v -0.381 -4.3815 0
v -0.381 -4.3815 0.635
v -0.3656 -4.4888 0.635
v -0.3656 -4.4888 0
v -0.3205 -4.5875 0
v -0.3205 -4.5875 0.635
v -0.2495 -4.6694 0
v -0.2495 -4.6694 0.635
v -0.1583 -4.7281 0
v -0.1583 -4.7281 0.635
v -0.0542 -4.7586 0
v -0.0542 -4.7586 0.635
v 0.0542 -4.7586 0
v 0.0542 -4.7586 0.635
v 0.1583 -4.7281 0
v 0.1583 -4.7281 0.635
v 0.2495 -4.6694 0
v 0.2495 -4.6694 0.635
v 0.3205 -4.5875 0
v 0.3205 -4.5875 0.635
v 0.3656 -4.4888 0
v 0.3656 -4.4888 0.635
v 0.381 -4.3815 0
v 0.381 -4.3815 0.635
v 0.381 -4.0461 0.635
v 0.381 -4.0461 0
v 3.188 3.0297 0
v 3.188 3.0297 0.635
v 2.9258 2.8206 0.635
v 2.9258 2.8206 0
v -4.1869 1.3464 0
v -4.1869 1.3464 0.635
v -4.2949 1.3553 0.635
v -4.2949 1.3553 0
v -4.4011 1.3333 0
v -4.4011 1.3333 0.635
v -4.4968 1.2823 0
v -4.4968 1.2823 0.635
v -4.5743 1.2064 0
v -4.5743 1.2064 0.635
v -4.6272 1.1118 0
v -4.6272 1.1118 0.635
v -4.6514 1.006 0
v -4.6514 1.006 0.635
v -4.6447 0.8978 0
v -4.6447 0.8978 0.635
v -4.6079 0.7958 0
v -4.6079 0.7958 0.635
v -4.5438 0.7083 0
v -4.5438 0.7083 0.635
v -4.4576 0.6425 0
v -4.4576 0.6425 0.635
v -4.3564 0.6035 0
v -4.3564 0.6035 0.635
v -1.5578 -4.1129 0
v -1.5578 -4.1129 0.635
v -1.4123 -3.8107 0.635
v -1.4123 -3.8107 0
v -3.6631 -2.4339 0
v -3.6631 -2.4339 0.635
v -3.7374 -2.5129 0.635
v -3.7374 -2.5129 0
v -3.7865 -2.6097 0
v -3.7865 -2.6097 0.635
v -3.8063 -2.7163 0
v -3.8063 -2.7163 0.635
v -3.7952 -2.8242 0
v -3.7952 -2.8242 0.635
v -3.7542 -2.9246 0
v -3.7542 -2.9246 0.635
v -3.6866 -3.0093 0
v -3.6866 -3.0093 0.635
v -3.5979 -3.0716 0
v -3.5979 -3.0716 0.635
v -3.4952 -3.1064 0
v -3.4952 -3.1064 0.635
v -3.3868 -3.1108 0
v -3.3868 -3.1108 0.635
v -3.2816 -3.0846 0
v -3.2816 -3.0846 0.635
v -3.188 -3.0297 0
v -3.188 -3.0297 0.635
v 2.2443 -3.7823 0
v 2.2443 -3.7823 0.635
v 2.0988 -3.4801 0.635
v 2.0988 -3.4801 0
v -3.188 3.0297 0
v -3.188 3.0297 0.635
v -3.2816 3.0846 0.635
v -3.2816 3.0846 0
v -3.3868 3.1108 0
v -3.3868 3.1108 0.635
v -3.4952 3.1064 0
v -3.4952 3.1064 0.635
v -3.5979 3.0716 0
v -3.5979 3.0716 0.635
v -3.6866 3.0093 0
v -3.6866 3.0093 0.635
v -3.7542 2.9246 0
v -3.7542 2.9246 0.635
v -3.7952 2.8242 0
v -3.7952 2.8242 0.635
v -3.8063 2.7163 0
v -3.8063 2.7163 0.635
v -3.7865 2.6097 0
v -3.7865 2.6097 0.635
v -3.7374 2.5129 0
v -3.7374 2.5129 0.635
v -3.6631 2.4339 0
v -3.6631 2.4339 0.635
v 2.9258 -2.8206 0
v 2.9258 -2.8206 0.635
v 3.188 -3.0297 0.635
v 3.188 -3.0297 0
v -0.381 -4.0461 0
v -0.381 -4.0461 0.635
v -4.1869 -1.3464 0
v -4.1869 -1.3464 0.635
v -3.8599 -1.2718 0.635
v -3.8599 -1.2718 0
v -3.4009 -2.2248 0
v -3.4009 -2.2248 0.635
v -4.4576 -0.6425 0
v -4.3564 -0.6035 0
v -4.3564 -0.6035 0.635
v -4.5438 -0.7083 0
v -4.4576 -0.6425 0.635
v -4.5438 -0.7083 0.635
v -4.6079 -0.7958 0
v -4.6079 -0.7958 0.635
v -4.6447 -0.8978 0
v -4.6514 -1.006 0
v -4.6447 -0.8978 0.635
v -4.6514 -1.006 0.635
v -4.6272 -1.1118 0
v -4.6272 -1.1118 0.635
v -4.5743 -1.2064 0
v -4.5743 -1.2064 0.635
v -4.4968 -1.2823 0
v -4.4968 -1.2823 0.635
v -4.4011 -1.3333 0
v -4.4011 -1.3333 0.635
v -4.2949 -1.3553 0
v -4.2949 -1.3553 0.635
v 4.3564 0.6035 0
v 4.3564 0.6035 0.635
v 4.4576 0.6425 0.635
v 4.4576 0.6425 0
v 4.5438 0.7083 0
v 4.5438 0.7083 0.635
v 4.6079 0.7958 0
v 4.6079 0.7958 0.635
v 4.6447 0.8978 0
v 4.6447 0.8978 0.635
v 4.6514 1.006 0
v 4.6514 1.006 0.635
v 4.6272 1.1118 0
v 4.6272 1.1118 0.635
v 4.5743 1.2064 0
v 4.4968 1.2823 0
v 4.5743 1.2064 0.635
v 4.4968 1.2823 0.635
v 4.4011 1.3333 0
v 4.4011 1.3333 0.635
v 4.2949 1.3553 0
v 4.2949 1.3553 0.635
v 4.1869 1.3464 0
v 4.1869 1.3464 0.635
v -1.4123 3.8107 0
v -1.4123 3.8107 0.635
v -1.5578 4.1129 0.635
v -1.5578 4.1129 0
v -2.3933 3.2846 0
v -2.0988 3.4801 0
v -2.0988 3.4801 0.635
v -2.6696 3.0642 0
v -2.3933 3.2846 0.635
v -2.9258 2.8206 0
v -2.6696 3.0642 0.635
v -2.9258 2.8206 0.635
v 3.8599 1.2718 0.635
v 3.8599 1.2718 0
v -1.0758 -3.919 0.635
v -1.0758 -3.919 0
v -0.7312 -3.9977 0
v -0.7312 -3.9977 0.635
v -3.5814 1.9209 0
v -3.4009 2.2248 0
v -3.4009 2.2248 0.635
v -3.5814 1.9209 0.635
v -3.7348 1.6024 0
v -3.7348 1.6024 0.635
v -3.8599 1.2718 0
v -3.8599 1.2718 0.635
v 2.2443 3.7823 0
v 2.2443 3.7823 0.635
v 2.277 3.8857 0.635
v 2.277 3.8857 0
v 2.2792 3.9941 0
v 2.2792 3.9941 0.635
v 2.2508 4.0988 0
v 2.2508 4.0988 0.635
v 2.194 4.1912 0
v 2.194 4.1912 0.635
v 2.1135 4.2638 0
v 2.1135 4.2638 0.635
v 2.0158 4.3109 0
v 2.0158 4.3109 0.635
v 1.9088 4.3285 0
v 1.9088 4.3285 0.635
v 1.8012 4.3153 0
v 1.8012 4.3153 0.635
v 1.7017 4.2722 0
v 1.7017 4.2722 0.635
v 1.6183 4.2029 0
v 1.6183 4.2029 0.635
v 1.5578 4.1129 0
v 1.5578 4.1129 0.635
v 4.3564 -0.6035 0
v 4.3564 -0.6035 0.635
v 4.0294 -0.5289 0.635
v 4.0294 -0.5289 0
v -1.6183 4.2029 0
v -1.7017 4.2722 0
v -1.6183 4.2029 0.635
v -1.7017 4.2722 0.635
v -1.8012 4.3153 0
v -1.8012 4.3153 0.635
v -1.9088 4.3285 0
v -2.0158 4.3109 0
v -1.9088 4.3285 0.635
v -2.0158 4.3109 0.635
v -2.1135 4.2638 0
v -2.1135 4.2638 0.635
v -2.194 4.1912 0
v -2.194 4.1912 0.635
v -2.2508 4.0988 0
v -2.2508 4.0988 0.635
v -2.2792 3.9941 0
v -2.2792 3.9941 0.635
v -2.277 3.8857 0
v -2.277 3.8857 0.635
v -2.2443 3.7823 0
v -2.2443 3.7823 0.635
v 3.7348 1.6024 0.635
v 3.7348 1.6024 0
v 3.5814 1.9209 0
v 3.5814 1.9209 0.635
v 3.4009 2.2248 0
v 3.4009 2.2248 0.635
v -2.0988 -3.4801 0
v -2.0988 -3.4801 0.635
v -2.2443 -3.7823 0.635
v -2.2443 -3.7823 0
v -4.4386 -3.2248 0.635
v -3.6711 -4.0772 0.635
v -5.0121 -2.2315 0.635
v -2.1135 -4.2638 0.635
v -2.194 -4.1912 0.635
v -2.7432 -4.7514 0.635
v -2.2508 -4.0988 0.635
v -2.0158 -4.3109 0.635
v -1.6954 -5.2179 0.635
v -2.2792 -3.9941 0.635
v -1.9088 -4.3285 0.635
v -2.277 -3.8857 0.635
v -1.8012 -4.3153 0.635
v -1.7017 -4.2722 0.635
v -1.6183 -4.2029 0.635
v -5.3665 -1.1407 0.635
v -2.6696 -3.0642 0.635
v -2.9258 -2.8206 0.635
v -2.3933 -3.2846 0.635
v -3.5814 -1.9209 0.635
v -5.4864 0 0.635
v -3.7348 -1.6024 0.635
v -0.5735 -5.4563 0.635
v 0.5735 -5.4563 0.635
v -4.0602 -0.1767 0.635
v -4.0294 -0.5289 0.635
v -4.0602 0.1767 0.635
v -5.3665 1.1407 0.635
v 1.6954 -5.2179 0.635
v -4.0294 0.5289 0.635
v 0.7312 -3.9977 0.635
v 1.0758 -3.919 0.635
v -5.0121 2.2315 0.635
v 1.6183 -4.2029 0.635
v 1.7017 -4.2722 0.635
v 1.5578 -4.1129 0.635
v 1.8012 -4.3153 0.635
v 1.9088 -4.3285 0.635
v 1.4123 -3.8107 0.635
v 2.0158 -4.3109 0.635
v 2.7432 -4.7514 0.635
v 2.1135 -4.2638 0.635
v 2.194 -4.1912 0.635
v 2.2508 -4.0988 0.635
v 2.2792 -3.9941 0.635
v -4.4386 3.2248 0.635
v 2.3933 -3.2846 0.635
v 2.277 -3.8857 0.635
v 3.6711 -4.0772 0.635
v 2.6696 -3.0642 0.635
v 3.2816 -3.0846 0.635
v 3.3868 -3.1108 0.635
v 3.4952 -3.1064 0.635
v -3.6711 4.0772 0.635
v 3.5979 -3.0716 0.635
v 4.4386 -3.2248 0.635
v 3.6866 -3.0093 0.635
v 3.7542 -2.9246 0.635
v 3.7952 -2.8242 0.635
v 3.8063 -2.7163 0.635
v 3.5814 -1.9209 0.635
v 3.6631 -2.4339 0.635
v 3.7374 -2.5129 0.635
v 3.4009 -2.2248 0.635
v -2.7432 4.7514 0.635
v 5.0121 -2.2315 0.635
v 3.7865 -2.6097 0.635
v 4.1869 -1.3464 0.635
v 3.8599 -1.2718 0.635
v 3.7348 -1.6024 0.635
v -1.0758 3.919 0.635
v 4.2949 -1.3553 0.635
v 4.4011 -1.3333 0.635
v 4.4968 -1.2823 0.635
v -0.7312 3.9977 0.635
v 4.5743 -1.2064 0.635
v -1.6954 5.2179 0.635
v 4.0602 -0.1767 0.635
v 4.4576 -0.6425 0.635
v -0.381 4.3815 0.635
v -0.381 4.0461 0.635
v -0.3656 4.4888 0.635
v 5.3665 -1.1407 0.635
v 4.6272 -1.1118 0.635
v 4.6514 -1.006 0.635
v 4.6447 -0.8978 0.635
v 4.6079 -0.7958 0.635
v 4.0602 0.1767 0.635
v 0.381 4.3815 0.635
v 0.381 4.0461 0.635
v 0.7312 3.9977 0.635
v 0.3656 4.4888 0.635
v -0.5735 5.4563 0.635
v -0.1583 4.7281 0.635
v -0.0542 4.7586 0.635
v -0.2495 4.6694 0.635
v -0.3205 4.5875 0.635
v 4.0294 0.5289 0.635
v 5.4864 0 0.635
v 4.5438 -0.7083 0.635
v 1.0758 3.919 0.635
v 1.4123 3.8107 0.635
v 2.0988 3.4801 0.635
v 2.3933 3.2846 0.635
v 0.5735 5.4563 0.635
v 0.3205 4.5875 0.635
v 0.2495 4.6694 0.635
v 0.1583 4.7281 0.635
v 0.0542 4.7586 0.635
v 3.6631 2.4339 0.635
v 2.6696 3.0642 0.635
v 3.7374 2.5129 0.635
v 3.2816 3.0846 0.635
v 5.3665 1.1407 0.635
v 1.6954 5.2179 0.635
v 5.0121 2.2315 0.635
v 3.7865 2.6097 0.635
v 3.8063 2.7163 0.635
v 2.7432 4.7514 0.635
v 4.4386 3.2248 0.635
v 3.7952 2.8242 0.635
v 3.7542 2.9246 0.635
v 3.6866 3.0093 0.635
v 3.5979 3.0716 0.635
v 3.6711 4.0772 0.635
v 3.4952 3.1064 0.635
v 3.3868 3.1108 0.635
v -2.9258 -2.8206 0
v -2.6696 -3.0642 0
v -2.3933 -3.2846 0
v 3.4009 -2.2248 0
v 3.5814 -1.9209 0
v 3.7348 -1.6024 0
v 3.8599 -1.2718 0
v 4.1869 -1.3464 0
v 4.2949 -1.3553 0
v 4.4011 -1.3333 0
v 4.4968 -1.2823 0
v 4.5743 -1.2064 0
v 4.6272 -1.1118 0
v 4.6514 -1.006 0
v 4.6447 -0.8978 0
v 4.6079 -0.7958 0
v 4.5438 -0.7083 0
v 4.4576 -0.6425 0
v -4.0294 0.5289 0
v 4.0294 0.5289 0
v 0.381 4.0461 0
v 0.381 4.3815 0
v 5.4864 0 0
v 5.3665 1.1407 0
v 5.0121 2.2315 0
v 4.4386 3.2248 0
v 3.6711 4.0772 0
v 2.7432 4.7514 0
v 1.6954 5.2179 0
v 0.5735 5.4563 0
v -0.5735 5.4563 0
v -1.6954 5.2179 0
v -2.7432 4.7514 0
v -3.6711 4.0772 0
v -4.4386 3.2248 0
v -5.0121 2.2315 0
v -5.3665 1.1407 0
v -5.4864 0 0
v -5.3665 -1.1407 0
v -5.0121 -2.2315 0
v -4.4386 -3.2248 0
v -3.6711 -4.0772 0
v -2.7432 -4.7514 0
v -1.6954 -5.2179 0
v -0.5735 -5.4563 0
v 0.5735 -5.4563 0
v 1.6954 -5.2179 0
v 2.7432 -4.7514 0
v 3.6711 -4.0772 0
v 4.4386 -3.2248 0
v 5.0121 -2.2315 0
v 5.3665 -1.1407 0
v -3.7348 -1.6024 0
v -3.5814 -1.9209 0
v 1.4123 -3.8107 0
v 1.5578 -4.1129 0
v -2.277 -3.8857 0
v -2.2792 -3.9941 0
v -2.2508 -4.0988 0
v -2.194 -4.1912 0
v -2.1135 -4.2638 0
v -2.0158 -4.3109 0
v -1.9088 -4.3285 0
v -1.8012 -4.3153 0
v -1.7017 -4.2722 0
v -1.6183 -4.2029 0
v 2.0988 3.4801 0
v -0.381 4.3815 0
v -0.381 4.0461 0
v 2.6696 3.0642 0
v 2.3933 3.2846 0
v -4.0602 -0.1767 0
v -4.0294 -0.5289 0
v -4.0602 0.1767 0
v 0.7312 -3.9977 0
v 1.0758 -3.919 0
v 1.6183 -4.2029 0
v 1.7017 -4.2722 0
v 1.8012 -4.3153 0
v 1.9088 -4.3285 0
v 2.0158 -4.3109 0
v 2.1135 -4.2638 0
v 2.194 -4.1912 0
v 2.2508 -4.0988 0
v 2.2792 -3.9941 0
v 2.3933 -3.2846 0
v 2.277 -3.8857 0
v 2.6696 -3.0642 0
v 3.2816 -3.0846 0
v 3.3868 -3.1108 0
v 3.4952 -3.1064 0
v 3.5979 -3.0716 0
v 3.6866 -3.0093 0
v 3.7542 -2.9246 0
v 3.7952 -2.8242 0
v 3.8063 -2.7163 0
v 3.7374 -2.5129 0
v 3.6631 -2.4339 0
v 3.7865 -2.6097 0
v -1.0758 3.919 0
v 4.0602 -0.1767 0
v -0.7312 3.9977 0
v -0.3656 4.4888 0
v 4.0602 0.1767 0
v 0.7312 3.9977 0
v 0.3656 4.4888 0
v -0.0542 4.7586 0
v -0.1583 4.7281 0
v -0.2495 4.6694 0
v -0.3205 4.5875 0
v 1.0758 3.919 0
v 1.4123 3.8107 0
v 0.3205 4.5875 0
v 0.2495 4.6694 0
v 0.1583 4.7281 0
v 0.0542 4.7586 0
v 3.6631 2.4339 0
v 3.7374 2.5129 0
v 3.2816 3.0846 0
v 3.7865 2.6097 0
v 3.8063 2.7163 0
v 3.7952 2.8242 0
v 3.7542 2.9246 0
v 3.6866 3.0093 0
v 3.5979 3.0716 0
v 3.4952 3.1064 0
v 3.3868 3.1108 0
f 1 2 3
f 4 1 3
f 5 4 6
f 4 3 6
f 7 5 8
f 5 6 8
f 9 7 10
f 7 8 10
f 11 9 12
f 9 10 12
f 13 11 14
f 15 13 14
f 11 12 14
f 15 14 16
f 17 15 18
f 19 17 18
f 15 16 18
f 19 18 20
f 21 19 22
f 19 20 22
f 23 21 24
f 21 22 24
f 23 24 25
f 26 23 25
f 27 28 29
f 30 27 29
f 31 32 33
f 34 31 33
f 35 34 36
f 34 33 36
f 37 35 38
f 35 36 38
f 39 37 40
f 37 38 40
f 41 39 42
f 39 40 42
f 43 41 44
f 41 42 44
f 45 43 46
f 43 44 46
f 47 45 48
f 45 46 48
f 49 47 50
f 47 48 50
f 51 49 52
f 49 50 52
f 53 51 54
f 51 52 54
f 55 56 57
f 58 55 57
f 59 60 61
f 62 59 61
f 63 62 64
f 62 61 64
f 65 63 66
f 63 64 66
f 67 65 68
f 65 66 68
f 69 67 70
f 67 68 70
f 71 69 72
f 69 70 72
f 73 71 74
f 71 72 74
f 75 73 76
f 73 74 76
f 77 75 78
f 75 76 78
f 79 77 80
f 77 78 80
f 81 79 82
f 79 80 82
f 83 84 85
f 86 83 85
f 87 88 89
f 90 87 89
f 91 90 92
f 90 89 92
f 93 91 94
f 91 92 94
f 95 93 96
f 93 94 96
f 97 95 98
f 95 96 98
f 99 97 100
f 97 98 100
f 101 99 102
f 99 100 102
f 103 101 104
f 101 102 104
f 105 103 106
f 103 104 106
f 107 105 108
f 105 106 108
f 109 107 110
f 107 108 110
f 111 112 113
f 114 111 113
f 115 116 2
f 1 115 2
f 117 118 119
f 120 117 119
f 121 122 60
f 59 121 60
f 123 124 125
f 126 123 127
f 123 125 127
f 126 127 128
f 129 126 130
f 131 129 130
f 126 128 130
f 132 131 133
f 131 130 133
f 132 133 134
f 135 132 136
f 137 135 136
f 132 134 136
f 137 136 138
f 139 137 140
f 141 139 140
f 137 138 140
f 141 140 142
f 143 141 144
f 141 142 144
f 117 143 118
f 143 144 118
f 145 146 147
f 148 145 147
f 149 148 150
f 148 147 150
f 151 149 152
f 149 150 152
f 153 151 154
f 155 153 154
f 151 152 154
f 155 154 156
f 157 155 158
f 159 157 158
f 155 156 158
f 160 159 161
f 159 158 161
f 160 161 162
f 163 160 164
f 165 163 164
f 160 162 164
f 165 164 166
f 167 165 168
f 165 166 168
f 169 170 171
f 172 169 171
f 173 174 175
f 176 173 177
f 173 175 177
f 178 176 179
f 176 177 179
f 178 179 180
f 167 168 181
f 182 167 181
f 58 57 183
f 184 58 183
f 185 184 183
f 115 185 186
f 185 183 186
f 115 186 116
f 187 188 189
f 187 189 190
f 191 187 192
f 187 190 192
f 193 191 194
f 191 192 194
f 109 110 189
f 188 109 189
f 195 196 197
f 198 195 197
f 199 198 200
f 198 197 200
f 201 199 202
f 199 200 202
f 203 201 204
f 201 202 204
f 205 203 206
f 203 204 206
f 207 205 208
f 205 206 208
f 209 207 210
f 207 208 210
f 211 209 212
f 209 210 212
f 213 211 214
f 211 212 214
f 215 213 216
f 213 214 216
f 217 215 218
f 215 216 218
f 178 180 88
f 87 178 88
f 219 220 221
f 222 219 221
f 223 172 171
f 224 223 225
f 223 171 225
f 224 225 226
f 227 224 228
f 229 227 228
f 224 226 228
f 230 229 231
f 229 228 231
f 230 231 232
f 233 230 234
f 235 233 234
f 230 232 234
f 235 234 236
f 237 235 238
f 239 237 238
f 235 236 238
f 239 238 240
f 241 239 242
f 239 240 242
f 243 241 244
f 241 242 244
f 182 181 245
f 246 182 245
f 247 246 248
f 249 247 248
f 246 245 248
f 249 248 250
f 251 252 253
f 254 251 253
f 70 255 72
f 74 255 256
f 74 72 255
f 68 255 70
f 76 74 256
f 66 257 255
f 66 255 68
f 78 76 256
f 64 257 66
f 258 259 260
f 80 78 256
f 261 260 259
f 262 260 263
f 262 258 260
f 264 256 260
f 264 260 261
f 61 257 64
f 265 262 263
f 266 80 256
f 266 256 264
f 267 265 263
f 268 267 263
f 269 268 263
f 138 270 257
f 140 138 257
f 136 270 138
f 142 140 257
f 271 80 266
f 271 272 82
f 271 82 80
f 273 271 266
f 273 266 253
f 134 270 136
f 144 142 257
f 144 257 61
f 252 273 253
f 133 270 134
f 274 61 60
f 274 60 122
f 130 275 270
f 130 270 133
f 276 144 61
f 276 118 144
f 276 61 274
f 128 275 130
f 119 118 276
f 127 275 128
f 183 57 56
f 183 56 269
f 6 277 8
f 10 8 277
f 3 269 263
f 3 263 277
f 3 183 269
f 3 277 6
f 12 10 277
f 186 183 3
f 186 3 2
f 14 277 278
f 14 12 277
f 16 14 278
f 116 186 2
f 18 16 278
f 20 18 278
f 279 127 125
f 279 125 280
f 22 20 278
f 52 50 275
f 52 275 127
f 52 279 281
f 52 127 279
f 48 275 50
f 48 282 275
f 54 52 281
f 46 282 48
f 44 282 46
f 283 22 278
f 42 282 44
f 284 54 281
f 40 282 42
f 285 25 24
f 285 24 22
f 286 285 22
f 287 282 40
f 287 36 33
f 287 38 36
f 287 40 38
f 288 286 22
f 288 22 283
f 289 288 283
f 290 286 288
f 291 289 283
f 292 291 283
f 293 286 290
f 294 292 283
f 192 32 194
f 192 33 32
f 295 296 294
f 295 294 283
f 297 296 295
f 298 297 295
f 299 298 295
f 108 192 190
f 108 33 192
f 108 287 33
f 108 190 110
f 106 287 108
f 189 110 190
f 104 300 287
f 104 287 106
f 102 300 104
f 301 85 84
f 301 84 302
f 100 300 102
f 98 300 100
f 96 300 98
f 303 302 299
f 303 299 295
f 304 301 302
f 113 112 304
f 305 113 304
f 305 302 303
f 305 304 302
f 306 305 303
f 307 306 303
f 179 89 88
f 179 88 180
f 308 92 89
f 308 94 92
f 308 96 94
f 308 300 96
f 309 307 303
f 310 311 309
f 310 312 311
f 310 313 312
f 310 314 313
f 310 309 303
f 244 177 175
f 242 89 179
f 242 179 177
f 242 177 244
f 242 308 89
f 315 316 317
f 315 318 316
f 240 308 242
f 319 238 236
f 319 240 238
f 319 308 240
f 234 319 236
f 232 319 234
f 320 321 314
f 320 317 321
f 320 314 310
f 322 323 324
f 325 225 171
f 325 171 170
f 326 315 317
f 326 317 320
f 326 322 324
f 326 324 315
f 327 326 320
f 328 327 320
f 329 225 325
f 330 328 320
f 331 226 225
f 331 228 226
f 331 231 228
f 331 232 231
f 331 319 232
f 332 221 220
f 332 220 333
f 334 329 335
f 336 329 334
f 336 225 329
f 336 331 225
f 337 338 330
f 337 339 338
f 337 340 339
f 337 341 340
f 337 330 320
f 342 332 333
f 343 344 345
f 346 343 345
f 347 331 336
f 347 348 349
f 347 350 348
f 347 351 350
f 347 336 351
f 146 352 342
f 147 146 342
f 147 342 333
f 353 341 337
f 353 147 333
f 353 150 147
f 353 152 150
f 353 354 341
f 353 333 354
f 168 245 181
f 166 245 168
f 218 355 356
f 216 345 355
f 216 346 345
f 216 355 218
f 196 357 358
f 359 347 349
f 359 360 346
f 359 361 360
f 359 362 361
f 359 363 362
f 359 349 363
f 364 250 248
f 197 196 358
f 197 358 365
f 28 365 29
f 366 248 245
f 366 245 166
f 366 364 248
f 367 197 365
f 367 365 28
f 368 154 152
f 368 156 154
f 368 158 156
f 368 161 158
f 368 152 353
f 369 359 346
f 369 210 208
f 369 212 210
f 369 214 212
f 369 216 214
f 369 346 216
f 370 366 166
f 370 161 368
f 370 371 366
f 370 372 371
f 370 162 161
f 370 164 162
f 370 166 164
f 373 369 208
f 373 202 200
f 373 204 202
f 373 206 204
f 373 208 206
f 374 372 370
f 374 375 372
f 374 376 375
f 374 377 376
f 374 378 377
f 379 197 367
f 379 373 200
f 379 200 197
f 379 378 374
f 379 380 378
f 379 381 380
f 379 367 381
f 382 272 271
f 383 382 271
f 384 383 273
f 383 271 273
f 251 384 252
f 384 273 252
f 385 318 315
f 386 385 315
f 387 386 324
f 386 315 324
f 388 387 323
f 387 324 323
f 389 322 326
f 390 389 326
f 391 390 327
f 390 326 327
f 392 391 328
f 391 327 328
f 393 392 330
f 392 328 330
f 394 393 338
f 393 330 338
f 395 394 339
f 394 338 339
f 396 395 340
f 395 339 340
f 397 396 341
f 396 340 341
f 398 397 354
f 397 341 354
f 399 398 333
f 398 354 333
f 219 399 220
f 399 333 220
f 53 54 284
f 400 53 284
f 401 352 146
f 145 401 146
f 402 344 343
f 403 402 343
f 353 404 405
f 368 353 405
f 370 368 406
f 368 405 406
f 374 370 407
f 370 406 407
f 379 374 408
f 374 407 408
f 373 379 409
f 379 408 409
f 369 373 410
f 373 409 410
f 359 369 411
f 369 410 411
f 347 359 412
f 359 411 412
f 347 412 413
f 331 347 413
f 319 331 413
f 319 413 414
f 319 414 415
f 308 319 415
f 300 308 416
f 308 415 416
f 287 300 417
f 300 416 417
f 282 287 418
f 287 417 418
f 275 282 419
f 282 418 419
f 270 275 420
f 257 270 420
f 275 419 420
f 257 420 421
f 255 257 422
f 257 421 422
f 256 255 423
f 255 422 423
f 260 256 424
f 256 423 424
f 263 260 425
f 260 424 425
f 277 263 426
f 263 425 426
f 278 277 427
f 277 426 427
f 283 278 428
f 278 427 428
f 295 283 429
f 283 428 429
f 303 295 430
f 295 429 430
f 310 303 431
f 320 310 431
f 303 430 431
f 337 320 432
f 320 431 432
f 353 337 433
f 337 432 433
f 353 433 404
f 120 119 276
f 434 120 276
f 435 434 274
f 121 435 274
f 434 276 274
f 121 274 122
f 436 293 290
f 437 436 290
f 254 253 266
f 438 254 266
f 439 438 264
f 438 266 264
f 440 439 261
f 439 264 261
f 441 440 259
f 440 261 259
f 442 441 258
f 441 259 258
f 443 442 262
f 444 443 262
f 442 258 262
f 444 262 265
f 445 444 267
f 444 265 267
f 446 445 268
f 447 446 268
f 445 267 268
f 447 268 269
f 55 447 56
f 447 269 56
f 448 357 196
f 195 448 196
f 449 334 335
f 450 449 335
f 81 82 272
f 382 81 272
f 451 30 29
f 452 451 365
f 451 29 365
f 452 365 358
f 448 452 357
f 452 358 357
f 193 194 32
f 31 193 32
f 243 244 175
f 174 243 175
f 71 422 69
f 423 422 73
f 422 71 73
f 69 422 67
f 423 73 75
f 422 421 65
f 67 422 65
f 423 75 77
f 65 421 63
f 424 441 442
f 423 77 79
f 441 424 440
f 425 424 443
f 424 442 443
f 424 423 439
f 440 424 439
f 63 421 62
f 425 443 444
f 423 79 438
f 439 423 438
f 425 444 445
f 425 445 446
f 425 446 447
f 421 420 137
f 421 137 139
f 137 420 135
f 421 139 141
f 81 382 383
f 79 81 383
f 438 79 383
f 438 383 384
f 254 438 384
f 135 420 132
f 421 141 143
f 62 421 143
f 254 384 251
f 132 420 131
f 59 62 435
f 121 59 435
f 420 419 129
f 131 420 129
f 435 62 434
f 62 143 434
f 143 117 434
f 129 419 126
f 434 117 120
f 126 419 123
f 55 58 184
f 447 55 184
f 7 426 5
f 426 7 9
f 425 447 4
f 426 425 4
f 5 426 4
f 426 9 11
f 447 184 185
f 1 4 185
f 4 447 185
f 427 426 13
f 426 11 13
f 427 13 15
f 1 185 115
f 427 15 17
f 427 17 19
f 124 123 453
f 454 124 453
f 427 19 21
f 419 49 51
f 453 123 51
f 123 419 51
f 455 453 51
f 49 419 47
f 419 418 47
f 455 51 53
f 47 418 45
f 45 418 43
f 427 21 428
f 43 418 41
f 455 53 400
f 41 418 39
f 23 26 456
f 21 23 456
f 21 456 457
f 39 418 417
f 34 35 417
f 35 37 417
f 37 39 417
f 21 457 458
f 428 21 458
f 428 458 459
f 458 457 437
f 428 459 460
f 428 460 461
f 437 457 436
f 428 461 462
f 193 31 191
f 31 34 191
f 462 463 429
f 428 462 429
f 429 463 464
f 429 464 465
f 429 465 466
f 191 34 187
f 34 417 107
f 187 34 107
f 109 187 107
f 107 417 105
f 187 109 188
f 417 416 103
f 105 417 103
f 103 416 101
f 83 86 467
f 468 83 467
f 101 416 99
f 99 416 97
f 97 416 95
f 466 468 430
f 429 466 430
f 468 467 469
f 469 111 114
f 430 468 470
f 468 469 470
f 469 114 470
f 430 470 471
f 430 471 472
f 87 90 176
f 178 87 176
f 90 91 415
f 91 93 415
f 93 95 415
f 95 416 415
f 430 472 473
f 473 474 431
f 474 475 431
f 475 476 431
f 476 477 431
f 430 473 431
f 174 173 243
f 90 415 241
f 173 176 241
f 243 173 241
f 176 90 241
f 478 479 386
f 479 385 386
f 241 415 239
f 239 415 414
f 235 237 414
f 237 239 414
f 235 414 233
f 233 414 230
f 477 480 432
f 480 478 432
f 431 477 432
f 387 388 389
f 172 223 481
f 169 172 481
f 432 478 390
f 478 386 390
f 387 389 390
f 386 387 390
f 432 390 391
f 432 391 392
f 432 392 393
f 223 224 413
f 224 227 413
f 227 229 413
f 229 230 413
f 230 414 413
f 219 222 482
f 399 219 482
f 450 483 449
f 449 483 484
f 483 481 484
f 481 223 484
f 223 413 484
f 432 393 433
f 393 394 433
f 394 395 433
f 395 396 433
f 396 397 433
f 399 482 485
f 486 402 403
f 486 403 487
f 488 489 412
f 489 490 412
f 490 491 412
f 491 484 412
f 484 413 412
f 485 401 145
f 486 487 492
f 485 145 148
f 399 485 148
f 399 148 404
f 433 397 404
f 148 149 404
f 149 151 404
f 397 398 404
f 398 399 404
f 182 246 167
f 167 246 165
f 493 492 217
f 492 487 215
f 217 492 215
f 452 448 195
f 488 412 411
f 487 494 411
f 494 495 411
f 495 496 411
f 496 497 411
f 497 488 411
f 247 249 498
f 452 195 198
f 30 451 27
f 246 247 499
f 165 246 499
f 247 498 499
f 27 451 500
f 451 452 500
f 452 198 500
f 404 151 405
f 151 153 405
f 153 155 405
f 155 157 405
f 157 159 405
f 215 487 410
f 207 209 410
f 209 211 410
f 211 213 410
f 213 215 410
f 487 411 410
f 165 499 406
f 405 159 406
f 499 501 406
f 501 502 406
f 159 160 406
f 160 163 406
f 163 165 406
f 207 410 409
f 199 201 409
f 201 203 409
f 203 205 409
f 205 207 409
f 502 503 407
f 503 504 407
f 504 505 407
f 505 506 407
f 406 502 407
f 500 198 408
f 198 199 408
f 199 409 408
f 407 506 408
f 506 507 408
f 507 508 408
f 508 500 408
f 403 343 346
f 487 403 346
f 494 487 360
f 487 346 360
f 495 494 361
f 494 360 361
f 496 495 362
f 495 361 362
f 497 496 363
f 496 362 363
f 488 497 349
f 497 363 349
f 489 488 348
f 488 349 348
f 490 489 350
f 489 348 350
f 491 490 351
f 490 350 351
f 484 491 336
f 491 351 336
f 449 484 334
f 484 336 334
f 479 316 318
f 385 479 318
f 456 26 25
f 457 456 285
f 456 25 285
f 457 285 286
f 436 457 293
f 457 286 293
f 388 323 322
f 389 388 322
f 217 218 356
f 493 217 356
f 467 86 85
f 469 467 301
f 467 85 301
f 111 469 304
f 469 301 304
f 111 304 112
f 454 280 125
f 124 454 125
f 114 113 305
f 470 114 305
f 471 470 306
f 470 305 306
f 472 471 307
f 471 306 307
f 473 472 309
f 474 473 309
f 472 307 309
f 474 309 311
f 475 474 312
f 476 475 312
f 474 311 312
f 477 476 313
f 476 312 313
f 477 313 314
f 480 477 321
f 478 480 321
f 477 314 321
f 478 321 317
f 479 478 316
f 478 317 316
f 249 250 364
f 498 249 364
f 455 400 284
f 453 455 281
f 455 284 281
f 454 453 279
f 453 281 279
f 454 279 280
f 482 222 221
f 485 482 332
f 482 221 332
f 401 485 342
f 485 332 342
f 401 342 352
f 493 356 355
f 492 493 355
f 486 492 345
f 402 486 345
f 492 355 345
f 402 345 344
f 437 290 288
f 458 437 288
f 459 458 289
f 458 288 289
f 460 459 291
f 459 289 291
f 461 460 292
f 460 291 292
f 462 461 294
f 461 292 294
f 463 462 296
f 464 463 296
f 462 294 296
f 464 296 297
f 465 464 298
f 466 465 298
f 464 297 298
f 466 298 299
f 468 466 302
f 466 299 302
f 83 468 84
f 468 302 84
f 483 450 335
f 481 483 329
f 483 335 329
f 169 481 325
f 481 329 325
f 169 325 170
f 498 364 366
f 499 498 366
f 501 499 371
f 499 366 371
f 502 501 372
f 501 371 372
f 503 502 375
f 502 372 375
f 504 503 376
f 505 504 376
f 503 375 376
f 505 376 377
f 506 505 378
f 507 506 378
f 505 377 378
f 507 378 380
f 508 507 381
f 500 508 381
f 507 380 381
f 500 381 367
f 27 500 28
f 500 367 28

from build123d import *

# Parameters (mm, degrees)
SKETCH1_R          = 5.4864
BASE_EXTRUDE_DEPTH = 0.635
SKETCH2_R          = 4.064
CUT_EXTRUDE1_DEPTH = 1.635
CUT_EXTRUDE4_DEPTH = 1.635
CIRPATTERN1_COUNT  = 14


with BuildPart() as part:
    # Sketch1 → Base-Extrude (new body)
    with BuildSketch(Plane.XY):
        Circle(SKETCH1_R)
    extrude(amount=BASE_EXTRUDE_DEPTH)

    # Sketch2 → Cut-Extrude1 (cut, through all)
    with BuildSketch(Plane.XY.offset(0.635)):
        Circle(SKETCH2_R)
    extrude(amount=-CUT_EXTRUDE1_DEPTH, mode=Mode.SUBTRACT)

    # Sketch3 → Cut-Extrude4 (cut, through all)
    with BuildSketch(Plane.XY.offset(0.635)):
        with BuildLine():
            Line((0.381, 4.04610121), (0.381, 4.3815))
            ThreePointArc((0.381, 4.3815), (0, 4.7625), (-0.381, 4.3815))
            Line((-0.381, 4.3815), (-0.381, 4.04610121))
            ThreePointArc((-0.381, 4.04610121), (0, 4.064), (0.381, 4.04610121))
        make_face()
    cut_extrude4 = extrude(amount=-CUT_EXTRUDE4_DEPTH, mode=Mode.SUBTRACT)

    # CirPattern1: Cut-Extrude4 ×14 about axis
    cirpattern1_axis = Axis((0, 0, 0), (0, 0, 1))
    for i in range(1, CIRPATTERN1_COUNT):
        add(cut_extrude4.rotate(cirpattern1_axis, i * 360 / CIRPATTERN1_COUNT), mode=Mode.SUBTRACT)


solid = part.part
